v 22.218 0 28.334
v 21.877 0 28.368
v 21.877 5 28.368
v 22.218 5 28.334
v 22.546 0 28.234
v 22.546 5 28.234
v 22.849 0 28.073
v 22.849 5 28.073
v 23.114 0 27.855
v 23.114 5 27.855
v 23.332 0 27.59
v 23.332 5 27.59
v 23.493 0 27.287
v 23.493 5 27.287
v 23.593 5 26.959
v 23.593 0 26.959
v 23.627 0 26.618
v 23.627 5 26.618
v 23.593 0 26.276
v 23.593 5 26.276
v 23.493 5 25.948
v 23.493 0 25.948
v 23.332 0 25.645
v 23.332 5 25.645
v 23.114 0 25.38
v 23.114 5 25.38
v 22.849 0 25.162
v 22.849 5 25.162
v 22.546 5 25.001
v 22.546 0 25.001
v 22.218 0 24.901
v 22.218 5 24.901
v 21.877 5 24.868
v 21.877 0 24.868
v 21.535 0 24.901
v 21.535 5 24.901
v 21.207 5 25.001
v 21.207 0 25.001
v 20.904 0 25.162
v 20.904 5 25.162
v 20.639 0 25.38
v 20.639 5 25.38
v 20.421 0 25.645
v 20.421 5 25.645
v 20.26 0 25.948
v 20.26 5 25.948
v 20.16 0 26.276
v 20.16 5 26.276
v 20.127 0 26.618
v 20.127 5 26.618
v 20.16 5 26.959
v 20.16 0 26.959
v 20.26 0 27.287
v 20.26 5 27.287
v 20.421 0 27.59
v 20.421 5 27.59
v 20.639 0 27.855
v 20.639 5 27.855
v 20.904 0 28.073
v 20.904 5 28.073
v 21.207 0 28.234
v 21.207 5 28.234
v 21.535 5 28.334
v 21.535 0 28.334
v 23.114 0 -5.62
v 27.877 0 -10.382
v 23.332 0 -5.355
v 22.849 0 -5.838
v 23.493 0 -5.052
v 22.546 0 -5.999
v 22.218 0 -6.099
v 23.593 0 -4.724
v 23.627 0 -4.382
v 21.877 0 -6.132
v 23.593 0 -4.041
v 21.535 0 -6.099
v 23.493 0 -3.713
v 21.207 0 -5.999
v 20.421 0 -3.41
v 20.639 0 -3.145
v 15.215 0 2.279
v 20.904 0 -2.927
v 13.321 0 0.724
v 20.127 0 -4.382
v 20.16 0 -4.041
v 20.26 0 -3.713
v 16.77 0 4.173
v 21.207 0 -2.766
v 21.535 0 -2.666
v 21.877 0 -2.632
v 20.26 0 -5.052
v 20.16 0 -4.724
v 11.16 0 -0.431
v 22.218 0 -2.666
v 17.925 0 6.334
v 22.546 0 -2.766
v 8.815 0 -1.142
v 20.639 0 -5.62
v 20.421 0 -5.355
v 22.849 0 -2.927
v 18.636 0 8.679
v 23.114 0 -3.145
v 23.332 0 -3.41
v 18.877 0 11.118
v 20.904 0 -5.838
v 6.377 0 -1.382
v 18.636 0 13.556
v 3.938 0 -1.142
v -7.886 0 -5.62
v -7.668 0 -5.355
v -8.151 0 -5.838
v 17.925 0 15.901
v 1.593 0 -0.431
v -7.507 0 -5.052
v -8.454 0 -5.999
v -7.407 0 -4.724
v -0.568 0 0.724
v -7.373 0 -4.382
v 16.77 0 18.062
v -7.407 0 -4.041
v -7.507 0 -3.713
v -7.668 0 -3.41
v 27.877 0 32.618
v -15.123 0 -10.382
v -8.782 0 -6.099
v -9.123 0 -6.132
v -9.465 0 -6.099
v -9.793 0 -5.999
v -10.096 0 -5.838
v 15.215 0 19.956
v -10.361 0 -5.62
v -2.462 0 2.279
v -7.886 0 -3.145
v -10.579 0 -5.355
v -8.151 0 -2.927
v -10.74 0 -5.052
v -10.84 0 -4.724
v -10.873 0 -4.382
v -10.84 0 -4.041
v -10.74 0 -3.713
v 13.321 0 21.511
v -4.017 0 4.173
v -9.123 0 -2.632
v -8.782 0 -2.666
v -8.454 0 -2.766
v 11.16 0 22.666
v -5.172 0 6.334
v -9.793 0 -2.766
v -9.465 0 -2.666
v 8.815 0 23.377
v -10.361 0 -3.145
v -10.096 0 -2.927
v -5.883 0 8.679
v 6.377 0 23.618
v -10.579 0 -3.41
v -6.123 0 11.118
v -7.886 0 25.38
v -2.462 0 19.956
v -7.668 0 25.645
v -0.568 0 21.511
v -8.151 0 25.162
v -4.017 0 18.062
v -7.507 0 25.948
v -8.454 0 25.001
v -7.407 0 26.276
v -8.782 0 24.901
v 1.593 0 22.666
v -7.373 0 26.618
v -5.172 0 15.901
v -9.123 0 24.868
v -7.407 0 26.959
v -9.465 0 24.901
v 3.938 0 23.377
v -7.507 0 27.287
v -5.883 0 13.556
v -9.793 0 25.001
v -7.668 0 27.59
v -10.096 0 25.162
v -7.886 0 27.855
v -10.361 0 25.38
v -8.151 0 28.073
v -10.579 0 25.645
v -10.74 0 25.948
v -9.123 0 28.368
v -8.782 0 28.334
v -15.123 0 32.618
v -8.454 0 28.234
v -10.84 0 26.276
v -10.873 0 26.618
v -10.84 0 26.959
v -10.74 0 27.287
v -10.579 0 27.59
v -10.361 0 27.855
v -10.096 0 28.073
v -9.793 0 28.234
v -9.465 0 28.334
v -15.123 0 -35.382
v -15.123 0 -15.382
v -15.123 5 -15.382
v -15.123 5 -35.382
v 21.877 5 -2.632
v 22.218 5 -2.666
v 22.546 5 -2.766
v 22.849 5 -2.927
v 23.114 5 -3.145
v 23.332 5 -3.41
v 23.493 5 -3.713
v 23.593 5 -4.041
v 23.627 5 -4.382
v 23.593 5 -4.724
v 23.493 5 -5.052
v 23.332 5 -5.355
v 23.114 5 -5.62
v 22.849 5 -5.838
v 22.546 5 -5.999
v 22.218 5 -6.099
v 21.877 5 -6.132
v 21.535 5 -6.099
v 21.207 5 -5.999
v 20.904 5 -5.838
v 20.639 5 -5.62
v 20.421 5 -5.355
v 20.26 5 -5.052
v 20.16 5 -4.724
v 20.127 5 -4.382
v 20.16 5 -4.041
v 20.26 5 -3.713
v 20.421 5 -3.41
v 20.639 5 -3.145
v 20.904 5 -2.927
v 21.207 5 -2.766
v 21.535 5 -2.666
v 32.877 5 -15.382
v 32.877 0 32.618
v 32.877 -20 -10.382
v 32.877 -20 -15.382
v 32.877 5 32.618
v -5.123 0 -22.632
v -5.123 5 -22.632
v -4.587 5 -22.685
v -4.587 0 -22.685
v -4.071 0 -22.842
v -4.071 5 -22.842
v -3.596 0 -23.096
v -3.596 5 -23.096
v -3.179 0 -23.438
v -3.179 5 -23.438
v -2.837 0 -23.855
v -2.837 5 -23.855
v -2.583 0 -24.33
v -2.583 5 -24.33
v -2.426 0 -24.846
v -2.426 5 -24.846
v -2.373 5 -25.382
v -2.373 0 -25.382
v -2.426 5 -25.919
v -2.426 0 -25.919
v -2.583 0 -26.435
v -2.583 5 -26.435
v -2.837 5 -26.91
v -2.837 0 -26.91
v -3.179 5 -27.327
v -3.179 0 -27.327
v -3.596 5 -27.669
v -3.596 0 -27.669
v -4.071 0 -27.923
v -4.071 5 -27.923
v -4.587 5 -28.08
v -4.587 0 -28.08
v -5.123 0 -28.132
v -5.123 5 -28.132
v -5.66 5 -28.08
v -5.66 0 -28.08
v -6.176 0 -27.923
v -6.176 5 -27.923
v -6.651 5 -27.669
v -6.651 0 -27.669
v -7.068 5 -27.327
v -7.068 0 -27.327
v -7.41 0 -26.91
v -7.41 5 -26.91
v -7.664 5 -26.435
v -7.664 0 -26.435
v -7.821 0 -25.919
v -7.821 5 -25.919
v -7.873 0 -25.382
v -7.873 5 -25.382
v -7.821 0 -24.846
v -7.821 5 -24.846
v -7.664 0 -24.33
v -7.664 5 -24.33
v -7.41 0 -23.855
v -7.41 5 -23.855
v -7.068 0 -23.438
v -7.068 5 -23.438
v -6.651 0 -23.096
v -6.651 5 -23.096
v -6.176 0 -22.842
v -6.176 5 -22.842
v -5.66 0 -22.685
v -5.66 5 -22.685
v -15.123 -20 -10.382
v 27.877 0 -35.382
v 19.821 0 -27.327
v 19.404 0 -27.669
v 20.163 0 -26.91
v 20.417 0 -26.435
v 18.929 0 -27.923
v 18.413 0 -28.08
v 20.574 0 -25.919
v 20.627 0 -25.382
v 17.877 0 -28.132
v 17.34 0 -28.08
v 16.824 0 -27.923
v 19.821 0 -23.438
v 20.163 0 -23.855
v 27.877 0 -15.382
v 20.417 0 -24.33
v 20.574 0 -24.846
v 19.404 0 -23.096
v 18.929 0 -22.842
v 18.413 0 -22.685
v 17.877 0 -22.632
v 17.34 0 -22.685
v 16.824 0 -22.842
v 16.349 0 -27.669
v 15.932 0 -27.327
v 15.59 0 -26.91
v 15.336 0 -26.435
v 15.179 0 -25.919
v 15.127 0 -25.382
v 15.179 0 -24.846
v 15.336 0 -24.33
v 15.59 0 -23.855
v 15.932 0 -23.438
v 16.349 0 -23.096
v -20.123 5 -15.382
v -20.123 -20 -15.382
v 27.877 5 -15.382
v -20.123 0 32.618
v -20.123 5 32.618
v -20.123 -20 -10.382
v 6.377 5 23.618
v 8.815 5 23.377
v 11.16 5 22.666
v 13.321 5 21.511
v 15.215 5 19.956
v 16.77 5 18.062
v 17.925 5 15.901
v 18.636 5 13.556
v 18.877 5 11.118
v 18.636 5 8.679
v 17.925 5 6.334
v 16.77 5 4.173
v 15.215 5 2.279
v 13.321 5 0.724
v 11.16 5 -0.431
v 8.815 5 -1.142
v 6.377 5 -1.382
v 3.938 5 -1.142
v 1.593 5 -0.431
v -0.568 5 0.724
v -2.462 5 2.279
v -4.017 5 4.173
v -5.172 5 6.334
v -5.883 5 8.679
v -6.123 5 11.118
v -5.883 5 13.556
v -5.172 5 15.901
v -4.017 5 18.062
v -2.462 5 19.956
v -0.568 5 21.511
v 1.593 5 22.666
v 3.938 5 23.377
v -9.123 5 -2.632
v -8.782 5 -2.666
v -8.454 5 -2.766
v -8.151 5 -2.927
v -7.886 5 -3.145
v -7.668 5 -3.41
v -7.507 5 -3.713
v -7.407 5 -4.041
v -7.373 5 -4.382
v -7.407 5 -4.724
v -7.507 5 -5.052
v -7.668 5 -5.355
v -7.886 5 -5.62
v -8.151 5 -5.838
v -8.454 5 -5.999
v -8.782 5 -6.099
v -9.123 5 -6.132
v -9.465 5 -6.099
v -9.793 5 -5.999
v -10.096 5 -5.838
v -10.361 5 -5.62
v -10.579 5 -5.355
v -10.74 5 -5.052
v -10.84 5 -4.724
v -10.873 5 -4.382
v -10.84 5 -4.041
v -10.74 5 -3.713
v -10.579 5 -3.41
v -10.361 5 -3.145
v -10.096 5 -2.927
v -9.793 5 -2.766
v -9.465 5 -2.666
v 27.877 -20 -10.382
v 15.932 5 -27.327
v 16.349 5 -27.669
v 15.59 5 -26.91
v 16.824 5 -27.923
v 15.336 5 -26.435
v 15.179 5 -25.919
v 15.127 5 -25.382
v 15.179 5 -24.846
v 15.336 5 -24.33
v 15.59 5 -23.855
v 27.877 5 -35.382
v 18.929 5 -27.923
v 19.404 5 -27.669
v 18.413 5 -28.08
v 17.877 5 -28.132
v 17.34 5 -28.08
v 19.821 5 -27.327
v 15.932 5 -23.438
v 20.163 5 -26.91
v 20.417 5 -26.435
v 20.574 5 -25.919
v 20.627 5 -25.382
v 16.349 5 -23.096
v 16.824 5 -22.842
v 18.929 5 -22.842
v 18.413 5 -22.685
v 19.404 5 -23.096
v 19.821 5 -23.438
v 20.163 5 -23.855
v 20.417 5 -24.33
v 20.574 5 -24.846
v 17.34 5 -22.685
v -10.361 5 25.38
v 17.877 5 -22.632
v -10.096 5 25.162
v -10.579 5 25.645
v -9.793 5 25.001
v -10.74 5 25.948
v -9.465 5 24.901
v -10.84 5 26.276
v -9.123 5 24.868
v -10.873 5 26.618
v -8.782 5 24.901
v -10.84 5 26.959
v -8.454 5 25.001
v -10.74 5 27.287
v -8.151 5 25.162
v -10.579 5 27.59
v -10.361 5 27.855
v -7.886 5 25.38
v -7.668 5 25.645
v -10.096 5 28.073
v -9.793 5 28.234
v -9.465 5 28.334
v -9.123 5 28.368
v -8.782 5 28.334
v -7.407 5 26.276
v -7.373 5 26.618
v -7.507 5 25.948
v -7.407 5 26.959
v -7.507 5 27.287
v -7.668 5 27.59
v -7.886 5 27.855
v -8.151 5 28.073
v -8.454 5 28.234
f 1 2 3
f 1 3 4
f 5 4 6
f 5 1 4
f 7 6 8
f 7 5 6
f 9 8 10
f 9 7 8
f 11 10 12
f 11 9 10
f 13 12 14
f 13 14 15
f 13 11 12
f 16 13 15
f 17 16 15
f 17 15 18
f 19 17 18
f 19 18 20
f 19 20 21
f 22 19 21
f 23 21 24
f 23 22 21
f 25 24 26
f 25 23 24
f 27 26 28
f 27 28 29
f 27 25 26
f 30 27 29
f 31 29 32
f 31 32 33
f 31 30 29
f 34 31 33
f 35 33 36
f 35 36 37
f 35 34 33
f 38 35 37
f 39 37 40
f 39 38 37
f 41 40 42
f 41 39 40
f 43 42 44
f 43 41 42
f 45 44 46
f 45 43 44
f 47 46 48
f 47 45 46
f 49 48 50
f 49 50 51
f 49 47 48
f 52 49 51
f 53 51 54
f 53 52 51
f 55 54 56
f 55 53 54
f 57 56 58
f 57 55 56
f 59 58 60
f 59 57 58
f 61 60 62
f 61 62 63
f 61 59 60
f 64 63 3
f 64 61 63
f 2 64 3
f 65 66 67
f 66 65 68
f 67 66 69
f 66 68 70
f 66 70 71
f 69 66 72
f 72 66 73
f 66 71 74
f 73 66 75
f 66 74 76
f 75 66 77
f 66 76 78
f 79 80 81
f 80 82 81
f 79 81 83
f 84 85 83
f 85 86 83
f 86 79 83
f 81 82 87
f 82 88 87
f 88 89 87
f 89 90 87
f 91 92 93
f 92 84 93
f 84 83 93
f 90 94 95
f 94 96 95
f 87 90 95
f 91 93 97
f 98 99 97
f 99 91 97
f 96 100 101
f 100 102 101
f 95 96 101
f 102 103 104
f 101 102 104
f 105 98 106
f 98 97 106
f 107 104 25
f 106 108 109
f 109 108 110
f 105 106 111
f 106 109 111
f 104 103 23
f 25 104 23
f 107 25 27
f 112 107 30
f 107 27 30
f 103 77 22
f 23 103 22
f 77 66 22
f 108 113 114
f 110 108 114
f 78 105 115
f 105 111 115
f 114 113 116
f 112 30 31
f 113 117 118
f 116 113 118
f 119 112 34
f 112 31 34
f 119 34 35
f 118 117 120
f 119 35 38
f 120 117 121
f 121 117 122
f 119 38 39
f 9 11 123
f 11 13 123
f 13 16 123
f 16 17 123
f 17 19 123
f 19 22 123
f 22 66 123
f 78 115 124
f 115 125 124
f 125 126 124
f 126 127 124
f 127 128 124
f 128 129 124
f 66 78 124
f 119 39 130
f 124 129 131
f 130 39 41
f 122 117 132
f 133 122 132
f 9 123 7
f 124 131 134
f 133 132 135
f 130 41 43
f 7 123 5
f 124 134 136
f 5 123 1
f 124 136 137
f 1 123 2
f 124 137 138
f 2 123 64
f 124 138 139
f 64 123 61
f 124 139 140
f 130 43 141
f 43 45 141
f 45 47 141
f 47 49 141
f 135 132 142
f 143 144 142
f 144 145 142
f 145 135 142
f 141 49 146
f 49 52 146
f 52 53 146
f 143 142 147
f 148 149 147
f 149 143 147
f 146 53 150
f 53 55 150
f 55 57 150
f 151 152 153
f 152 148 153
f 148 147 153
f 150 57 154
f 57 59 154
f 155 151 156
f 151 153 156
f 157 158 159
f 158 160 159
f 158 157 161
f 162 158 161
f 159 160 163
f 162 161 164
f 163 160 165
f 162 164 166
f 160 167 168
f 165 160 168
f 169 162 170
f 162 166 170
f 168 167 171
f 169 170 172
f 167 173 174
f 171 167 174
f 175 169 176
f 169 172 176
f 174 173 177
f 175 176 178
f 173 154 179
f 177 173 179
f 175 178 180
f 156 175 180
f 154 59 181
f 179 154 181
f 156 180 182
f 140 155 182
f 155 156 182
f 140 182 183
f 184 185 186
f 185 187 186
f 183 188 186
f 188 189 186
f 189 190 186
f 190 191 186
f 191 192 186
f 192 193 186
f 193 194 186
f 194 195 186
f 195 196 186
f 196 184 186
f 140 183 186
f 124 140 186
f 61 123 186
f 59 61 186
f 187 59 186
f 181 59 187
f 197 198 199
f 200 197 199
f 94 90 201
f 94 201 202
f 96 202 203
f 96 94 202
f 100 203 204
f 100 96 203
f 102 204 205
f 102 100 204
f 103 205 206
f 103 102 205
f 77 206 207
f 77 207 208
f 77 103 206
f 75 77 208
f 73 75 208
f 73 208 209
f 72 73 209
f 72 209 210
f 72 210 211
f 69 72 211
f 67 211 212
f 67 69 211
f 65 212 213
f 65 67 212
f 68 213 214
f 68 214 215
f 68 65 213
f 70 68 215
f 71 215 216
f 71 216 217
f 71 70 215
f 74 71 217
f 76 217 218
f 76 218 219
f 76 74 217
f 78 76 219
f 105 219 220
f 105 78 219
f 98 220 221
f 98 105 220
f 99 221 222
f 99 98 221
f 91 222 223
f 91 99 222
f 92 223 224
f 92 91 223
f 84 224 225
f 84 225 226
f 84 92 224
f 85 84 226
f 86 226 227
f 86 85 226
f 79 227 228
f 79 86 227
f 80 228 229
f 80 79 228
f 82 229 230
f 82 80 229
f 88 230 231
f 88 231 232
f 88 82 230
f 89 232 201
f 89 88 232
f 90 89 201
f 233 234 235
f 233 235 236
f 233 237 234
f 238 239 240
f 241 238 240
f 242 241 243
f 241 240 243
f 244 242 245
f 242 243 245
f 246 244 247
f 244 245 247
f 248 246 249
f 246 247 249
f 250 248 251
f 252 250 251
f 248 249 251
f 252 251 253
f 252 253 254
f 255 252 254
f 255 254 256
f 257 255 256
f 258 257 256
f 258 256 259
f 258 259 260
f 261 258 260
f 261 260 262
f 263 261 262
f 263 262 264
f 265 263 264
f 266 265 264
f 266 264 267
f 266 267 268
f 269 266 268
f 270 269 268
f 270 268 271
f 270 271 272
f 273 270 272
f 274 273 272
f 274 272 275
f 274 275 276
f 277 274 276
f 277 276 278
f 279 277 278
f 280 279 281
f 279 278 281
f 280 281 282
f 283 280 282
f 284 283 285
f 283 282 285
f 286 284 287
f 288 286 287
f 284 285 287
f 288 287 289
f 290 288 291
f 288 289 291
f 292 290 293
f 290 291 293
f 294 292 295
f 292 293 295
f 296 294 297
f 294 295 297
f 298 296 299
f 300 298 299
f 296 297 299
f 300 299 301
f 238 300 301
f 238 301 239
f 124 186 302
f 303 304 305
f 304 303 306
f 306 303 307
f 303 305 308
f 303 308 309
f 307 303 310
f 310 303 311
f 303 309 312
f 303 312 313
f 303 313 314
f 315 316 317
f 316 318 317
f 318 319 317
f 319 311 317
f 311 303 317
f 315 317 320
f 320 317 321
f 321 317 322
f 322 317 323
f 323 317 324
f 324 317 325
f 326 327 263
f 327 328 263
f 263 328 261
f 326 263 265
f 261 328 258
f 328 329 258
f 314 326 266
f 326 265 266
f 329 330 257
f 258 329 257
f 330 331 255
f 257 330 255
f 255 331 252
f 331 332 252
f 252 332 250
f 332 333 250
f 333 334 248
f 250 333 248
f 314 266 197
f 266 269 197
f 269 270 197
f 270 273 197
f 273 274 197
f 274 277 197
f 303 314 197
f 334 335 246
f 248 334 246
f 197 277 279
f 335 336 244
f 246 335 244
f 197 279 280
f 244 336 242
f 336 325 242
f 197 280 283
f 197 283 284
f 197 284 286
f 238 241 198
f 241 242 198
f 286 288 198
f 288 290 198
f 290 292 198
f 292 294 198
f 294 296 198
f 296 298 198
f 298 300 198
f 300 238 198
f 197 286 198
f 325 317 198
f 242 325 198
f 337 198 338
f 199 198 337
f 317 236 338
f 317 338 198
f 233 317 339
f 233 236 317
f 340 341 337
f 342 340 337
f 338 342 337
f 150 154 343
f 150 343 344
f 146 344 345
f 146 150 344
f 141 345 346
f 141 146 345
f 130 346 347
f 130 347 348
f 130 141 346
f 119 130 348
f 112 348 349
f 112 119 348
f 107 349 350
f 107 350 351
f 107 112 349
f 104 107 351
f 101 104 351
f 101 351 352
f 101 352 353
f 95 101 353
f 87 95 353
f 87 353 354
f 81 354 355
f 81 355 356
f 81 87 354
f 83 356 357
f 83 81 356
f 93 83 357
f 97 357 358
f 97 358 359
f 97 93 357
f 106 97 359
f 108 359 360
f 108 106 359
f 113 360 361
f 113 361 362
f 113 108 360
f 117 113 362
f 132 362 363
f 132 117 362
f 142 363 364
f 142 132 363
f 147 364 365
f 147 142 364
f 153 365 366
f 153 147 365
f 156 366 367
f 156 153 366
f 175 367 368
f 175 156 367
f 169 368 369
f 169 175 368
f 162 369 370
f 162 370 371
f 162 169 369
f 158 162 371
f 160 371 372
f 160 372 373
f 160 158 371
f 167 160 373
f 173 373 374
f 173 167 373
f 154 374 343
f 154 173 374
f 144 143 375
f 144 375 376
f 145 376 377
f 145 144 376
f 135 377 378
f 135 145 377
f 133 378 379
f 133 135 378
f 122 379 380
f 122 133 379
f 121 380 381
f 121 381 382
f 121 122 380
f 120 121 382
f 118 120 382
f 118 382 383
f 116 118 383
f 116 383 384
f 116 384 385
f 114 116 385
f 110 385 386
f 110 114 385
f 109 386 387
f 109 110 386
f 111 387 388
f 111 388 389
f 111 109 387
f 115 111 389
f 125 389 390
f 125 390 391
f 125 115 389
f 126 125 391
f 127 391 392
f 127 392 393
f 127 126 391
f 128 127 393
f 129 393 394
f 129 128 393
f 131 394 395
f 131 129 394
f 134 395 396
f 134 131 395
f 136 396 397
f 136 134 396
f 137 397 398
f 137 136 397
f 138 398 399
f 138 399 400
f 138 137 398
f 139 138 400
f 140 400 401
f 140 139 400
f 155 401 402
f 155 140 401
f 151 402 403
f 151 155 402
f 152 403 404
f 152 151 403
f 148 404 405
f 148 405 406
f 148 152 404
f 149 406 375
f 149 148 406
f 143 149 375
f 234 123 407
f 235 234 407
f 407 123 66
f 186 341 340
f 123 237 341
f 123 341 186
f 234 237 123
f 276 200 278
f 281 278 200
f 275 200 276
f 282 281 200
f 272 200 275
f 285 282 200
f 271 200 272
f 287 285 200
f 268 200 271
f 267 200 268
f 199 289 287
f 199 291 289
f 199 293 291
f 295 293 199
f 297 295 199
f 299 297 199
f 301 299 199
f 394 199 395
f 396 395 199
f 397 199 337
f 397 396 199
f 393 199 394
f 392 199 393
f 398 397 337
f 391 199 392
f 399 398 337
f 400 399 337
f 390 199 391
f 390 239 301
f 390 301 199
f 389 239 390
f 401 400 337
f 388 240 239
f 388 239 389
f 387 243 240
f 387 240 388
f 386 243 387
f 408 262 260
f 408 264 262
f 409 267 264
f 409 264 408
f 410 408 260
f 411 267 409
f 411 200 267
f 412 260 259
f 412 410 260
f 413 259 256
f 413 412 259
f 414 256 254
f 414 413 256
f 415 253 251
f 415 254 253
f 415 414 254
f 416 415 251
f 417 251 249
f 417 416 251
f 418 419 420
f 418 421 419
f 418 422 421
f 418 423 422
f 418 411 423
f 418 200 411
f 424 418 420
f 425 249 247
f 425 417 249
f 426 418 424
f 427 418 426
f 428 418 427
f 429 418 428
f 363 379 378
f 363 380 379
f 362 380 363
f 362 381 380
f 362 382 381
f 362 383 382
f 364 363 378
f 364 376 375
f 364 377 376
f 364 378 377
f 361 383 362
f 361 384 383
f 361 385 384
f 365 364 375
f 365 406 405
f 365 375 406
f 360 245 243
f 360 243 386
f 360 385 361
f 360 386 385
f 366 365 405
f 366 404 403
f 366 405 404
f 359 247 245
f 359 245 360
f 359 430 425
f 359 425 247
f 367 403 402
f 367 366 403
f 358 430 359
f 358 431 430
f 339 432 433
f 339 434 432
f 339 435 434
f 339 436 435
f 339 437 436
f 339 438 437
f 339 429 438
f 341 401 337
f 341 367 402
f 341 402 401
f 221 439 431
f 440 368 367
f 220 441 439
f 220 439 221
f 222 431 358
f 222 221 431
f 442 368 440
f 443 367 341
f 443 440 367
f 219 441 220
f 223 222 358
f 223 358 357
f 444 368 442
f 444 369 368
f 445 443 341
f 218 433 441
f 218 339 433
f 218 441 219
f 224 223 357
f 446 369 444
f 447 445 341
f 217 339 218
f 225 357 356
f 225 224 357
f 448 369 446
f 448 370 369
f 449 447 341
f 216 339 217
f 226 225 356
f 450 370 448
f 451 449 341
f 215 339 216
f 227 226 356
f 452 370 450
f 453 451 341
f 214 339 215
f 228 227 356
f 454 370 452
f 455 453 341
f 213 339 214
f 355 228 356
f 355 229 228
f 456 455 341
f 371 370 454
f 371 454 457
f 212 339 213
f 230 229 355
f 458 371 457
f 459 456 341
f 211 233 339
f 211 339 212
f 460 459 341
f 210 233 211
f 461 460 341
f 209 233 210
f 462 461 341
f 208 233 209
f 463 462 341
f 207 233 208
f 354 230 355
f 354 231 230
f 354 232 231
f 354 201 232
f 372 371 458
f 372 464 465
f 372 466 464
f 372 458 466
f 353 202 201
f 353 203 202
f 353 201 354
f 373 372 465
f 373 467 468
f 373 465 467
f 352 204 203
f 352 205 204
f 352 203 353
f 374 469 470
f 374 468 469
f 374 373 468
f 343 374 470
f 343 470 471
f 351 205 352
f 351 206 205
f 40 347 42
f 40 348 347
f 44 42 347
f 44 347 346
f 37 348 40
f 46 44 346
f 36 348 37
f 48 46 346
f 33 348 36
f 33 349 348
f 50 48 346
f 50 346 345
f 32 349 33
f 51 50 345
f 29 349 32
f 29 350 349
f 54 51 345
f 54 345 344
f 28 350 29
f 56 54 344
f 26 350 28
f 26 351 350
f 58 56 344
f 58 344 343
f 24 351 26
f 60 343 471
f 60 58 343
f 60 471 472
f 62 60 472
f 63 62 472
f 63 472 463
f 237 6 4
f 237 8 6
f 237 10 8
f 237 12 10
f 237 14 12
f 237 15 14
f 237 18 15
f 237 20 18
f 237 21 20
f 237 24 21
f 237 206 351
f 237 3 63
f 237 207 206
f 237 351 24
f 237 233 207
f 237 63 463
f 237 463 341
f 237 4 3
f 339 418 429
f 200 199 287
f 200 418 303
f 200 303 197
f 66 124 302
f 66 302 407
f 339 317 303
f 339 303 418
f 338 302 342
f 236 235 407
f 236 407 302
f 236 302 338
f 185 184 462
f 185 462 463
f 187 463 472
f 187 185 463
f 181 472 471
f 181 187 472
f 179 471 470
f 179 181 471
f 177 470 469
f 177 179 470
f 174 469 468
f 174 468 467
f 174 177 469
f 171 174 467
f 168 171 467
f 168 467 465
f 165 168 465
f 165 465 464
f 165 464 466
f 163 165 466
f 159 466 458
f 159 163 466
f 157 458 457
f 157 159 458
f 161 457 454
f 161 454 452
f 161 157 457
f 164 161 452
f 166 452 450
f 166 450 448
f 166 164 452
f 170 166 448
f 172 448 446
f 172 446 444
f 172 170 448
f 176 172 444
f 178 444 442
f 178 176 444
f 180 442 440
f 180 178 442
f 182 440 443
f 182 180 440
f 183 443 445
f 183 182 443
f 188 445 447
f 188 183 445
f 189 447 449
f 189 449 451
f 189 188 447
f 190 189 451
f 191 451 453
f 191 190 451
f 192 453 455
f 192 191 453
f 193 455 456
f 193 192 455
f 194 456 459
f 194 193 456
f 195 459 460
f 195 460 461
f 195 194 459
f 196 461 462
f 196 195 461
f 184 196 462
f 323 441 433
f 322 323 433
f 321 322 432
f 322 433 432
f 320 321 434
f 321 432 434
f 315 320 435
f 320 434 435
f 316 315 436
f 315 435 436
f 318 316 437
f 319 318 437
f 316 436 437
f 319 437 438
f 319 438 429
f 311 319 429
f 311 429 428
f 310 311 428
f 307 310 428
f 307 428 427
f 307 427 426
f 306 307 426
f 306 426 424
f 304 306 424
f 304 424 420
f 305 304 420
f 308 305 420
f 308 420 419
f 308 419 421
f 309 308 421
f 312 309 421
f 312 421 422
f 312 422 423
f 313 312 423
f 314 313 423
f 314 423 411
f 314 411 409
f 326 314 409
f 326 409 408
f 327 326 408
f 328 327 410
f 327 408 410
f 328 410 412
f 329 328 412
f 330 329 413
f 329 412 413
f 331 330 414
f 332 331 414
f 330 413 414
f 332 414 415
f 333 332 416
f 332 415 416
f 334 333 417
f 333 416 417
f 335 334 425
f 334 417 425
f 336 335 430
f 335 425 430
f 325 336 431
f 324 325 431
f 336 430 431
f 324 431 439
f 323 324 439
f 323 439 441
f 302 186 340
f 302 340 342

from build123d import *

# Parameters (mm, degrees)
SKETCH_1_W          = 43
SKETCH_1_H          = 43
SKETCH_1_R          = 1.75
SKETCH_1_R_2        = 12.5
EXTRUDE_1_DEPTH     = 5
SKETCH_2_W          = 43
SKETCH_2_H          = 5
EXTRUDE_2_DEPTH     = 25
SKETCH_3_W          = 43
SKETCH_3_H          = 5
EXTRUDE_3_DEPTH     = 20
EXTRUDE_4_DEPTH     = 5
EXTRUDE_6_DEPTH     = 5
SKETCH_10_R         = 2.75
CUT_EXTRUDE_1_DEPTH = 55.385549855


with BuildPart() as part:
    # 草图1 → 凸台-拉伸1 (new body)
    with BuildSketch(Plane(origin=(0, 0, 0), x_dir=(1, 0, 0), z_dir=(0, 1, 0))):
        with Locations((6.376567293, -11.117527558)):
            Rectangle(SKETCH_1_W, SKETCH_1_H)
        with Locations(Location((-9.123432707, -26.617527558, 0), (0, 0, 270))):
            Circle(SKETCH_1_R, mode=Mode.SUBTRACT)
        with Locations(Location((21.876567293, -26.617527558, 0), (0, 0, 270))):
            Circle(SKETCH_1_R, mode=Mode.SUBTRACT)
        with Locations(Location((21.876567293, 4.382472442, 0), (0, 0, 270))):
            Circle(SKETCH_1_R, mode=Mode.SUBTRACT)
        with Locations(Location((-9.123432707, 4.382472442, 0), (0, 0, 270))):
            Circle(SKETCH_1_R, mode=Mode.SUBTRACT)
        with Locations(Location((6.376567293, -11.117527558, 0), (0, 0, 270))):
            Circle(SKETCH_1_R_2, mode=Mode.SUBTRACT)
    extrude(amount=EXTRUDE_1_DEPTH)

    # 草图2 → 凸台-拉伸2 (add)
    with BuildSketch(Plane(origin=(0, 0, -10.382472442), x_dir=(-1, 0, 0), z_dir=(0, 0, -1))):
        with Locations((-6.376567293, 2.5)):
            Rectangle(SKETCH_2_W, SKETCH_2_H)
    extrude(amount=EXTRUDE_2_DEPTH)

    # 草图3 → 凸台-拉伸3 (add)
    with BuildSketch(Plane.XZ):
        with Locations((6.376567293, -12.882472442)):
            Rectangle(SKETCH_3_W, SKETCH_3_H)
    extrude(amount=EXTRUDE_3_DEPTH)

    # 草图4 → 凸台-拉伸4 (add)
    with BuildSketch(Plane(origin=(27.876567293, 0, 0), x_dir=(0, 0, -1), z_dir=(1, 0, 0))):
        Polygon((-32.617527558, 0), (10.382472442, -20), (15.382472442, -20), (15.382472442, 5), (-32.617527558, 5), align=None)
    extrude(amount=EXTRUDE_4_DEPTH)

    # 草图9 → 凸台-拉伸6 (add)
    with BuildSketch(Plane.ZY.offset(15.123432707)):
        Polygon((32.617527558, 5), (32.617527558, 0), (-10.382472442, -20), (-15.382472442, -20), (-15.382472442, 5), align=None)
    extrude(amount=EXTRUDE_6_DEPTH)

    # 草图10 → 切除-拉伸1 (cut, through all)
    with BuildSketch(Plane(origin=(0, 5, 0), x_dir=(1, 0, 0), z_dir=(0, 1, 0))):
        with Locations(Location((-5.123432707, 25.382472442, 0), (0, 0, 270))):
            Circle(SKETCH_10_R)
        with Locations(Location((17.876567293, 25.382472442, 0), (0, 0, 270))):
            Circle(SKETCH_10_R)
    extrude(amount=-CUT_EXTRUDE_1_DEPTH, mode=Mode.SUBTRACT)


solid = part.part
